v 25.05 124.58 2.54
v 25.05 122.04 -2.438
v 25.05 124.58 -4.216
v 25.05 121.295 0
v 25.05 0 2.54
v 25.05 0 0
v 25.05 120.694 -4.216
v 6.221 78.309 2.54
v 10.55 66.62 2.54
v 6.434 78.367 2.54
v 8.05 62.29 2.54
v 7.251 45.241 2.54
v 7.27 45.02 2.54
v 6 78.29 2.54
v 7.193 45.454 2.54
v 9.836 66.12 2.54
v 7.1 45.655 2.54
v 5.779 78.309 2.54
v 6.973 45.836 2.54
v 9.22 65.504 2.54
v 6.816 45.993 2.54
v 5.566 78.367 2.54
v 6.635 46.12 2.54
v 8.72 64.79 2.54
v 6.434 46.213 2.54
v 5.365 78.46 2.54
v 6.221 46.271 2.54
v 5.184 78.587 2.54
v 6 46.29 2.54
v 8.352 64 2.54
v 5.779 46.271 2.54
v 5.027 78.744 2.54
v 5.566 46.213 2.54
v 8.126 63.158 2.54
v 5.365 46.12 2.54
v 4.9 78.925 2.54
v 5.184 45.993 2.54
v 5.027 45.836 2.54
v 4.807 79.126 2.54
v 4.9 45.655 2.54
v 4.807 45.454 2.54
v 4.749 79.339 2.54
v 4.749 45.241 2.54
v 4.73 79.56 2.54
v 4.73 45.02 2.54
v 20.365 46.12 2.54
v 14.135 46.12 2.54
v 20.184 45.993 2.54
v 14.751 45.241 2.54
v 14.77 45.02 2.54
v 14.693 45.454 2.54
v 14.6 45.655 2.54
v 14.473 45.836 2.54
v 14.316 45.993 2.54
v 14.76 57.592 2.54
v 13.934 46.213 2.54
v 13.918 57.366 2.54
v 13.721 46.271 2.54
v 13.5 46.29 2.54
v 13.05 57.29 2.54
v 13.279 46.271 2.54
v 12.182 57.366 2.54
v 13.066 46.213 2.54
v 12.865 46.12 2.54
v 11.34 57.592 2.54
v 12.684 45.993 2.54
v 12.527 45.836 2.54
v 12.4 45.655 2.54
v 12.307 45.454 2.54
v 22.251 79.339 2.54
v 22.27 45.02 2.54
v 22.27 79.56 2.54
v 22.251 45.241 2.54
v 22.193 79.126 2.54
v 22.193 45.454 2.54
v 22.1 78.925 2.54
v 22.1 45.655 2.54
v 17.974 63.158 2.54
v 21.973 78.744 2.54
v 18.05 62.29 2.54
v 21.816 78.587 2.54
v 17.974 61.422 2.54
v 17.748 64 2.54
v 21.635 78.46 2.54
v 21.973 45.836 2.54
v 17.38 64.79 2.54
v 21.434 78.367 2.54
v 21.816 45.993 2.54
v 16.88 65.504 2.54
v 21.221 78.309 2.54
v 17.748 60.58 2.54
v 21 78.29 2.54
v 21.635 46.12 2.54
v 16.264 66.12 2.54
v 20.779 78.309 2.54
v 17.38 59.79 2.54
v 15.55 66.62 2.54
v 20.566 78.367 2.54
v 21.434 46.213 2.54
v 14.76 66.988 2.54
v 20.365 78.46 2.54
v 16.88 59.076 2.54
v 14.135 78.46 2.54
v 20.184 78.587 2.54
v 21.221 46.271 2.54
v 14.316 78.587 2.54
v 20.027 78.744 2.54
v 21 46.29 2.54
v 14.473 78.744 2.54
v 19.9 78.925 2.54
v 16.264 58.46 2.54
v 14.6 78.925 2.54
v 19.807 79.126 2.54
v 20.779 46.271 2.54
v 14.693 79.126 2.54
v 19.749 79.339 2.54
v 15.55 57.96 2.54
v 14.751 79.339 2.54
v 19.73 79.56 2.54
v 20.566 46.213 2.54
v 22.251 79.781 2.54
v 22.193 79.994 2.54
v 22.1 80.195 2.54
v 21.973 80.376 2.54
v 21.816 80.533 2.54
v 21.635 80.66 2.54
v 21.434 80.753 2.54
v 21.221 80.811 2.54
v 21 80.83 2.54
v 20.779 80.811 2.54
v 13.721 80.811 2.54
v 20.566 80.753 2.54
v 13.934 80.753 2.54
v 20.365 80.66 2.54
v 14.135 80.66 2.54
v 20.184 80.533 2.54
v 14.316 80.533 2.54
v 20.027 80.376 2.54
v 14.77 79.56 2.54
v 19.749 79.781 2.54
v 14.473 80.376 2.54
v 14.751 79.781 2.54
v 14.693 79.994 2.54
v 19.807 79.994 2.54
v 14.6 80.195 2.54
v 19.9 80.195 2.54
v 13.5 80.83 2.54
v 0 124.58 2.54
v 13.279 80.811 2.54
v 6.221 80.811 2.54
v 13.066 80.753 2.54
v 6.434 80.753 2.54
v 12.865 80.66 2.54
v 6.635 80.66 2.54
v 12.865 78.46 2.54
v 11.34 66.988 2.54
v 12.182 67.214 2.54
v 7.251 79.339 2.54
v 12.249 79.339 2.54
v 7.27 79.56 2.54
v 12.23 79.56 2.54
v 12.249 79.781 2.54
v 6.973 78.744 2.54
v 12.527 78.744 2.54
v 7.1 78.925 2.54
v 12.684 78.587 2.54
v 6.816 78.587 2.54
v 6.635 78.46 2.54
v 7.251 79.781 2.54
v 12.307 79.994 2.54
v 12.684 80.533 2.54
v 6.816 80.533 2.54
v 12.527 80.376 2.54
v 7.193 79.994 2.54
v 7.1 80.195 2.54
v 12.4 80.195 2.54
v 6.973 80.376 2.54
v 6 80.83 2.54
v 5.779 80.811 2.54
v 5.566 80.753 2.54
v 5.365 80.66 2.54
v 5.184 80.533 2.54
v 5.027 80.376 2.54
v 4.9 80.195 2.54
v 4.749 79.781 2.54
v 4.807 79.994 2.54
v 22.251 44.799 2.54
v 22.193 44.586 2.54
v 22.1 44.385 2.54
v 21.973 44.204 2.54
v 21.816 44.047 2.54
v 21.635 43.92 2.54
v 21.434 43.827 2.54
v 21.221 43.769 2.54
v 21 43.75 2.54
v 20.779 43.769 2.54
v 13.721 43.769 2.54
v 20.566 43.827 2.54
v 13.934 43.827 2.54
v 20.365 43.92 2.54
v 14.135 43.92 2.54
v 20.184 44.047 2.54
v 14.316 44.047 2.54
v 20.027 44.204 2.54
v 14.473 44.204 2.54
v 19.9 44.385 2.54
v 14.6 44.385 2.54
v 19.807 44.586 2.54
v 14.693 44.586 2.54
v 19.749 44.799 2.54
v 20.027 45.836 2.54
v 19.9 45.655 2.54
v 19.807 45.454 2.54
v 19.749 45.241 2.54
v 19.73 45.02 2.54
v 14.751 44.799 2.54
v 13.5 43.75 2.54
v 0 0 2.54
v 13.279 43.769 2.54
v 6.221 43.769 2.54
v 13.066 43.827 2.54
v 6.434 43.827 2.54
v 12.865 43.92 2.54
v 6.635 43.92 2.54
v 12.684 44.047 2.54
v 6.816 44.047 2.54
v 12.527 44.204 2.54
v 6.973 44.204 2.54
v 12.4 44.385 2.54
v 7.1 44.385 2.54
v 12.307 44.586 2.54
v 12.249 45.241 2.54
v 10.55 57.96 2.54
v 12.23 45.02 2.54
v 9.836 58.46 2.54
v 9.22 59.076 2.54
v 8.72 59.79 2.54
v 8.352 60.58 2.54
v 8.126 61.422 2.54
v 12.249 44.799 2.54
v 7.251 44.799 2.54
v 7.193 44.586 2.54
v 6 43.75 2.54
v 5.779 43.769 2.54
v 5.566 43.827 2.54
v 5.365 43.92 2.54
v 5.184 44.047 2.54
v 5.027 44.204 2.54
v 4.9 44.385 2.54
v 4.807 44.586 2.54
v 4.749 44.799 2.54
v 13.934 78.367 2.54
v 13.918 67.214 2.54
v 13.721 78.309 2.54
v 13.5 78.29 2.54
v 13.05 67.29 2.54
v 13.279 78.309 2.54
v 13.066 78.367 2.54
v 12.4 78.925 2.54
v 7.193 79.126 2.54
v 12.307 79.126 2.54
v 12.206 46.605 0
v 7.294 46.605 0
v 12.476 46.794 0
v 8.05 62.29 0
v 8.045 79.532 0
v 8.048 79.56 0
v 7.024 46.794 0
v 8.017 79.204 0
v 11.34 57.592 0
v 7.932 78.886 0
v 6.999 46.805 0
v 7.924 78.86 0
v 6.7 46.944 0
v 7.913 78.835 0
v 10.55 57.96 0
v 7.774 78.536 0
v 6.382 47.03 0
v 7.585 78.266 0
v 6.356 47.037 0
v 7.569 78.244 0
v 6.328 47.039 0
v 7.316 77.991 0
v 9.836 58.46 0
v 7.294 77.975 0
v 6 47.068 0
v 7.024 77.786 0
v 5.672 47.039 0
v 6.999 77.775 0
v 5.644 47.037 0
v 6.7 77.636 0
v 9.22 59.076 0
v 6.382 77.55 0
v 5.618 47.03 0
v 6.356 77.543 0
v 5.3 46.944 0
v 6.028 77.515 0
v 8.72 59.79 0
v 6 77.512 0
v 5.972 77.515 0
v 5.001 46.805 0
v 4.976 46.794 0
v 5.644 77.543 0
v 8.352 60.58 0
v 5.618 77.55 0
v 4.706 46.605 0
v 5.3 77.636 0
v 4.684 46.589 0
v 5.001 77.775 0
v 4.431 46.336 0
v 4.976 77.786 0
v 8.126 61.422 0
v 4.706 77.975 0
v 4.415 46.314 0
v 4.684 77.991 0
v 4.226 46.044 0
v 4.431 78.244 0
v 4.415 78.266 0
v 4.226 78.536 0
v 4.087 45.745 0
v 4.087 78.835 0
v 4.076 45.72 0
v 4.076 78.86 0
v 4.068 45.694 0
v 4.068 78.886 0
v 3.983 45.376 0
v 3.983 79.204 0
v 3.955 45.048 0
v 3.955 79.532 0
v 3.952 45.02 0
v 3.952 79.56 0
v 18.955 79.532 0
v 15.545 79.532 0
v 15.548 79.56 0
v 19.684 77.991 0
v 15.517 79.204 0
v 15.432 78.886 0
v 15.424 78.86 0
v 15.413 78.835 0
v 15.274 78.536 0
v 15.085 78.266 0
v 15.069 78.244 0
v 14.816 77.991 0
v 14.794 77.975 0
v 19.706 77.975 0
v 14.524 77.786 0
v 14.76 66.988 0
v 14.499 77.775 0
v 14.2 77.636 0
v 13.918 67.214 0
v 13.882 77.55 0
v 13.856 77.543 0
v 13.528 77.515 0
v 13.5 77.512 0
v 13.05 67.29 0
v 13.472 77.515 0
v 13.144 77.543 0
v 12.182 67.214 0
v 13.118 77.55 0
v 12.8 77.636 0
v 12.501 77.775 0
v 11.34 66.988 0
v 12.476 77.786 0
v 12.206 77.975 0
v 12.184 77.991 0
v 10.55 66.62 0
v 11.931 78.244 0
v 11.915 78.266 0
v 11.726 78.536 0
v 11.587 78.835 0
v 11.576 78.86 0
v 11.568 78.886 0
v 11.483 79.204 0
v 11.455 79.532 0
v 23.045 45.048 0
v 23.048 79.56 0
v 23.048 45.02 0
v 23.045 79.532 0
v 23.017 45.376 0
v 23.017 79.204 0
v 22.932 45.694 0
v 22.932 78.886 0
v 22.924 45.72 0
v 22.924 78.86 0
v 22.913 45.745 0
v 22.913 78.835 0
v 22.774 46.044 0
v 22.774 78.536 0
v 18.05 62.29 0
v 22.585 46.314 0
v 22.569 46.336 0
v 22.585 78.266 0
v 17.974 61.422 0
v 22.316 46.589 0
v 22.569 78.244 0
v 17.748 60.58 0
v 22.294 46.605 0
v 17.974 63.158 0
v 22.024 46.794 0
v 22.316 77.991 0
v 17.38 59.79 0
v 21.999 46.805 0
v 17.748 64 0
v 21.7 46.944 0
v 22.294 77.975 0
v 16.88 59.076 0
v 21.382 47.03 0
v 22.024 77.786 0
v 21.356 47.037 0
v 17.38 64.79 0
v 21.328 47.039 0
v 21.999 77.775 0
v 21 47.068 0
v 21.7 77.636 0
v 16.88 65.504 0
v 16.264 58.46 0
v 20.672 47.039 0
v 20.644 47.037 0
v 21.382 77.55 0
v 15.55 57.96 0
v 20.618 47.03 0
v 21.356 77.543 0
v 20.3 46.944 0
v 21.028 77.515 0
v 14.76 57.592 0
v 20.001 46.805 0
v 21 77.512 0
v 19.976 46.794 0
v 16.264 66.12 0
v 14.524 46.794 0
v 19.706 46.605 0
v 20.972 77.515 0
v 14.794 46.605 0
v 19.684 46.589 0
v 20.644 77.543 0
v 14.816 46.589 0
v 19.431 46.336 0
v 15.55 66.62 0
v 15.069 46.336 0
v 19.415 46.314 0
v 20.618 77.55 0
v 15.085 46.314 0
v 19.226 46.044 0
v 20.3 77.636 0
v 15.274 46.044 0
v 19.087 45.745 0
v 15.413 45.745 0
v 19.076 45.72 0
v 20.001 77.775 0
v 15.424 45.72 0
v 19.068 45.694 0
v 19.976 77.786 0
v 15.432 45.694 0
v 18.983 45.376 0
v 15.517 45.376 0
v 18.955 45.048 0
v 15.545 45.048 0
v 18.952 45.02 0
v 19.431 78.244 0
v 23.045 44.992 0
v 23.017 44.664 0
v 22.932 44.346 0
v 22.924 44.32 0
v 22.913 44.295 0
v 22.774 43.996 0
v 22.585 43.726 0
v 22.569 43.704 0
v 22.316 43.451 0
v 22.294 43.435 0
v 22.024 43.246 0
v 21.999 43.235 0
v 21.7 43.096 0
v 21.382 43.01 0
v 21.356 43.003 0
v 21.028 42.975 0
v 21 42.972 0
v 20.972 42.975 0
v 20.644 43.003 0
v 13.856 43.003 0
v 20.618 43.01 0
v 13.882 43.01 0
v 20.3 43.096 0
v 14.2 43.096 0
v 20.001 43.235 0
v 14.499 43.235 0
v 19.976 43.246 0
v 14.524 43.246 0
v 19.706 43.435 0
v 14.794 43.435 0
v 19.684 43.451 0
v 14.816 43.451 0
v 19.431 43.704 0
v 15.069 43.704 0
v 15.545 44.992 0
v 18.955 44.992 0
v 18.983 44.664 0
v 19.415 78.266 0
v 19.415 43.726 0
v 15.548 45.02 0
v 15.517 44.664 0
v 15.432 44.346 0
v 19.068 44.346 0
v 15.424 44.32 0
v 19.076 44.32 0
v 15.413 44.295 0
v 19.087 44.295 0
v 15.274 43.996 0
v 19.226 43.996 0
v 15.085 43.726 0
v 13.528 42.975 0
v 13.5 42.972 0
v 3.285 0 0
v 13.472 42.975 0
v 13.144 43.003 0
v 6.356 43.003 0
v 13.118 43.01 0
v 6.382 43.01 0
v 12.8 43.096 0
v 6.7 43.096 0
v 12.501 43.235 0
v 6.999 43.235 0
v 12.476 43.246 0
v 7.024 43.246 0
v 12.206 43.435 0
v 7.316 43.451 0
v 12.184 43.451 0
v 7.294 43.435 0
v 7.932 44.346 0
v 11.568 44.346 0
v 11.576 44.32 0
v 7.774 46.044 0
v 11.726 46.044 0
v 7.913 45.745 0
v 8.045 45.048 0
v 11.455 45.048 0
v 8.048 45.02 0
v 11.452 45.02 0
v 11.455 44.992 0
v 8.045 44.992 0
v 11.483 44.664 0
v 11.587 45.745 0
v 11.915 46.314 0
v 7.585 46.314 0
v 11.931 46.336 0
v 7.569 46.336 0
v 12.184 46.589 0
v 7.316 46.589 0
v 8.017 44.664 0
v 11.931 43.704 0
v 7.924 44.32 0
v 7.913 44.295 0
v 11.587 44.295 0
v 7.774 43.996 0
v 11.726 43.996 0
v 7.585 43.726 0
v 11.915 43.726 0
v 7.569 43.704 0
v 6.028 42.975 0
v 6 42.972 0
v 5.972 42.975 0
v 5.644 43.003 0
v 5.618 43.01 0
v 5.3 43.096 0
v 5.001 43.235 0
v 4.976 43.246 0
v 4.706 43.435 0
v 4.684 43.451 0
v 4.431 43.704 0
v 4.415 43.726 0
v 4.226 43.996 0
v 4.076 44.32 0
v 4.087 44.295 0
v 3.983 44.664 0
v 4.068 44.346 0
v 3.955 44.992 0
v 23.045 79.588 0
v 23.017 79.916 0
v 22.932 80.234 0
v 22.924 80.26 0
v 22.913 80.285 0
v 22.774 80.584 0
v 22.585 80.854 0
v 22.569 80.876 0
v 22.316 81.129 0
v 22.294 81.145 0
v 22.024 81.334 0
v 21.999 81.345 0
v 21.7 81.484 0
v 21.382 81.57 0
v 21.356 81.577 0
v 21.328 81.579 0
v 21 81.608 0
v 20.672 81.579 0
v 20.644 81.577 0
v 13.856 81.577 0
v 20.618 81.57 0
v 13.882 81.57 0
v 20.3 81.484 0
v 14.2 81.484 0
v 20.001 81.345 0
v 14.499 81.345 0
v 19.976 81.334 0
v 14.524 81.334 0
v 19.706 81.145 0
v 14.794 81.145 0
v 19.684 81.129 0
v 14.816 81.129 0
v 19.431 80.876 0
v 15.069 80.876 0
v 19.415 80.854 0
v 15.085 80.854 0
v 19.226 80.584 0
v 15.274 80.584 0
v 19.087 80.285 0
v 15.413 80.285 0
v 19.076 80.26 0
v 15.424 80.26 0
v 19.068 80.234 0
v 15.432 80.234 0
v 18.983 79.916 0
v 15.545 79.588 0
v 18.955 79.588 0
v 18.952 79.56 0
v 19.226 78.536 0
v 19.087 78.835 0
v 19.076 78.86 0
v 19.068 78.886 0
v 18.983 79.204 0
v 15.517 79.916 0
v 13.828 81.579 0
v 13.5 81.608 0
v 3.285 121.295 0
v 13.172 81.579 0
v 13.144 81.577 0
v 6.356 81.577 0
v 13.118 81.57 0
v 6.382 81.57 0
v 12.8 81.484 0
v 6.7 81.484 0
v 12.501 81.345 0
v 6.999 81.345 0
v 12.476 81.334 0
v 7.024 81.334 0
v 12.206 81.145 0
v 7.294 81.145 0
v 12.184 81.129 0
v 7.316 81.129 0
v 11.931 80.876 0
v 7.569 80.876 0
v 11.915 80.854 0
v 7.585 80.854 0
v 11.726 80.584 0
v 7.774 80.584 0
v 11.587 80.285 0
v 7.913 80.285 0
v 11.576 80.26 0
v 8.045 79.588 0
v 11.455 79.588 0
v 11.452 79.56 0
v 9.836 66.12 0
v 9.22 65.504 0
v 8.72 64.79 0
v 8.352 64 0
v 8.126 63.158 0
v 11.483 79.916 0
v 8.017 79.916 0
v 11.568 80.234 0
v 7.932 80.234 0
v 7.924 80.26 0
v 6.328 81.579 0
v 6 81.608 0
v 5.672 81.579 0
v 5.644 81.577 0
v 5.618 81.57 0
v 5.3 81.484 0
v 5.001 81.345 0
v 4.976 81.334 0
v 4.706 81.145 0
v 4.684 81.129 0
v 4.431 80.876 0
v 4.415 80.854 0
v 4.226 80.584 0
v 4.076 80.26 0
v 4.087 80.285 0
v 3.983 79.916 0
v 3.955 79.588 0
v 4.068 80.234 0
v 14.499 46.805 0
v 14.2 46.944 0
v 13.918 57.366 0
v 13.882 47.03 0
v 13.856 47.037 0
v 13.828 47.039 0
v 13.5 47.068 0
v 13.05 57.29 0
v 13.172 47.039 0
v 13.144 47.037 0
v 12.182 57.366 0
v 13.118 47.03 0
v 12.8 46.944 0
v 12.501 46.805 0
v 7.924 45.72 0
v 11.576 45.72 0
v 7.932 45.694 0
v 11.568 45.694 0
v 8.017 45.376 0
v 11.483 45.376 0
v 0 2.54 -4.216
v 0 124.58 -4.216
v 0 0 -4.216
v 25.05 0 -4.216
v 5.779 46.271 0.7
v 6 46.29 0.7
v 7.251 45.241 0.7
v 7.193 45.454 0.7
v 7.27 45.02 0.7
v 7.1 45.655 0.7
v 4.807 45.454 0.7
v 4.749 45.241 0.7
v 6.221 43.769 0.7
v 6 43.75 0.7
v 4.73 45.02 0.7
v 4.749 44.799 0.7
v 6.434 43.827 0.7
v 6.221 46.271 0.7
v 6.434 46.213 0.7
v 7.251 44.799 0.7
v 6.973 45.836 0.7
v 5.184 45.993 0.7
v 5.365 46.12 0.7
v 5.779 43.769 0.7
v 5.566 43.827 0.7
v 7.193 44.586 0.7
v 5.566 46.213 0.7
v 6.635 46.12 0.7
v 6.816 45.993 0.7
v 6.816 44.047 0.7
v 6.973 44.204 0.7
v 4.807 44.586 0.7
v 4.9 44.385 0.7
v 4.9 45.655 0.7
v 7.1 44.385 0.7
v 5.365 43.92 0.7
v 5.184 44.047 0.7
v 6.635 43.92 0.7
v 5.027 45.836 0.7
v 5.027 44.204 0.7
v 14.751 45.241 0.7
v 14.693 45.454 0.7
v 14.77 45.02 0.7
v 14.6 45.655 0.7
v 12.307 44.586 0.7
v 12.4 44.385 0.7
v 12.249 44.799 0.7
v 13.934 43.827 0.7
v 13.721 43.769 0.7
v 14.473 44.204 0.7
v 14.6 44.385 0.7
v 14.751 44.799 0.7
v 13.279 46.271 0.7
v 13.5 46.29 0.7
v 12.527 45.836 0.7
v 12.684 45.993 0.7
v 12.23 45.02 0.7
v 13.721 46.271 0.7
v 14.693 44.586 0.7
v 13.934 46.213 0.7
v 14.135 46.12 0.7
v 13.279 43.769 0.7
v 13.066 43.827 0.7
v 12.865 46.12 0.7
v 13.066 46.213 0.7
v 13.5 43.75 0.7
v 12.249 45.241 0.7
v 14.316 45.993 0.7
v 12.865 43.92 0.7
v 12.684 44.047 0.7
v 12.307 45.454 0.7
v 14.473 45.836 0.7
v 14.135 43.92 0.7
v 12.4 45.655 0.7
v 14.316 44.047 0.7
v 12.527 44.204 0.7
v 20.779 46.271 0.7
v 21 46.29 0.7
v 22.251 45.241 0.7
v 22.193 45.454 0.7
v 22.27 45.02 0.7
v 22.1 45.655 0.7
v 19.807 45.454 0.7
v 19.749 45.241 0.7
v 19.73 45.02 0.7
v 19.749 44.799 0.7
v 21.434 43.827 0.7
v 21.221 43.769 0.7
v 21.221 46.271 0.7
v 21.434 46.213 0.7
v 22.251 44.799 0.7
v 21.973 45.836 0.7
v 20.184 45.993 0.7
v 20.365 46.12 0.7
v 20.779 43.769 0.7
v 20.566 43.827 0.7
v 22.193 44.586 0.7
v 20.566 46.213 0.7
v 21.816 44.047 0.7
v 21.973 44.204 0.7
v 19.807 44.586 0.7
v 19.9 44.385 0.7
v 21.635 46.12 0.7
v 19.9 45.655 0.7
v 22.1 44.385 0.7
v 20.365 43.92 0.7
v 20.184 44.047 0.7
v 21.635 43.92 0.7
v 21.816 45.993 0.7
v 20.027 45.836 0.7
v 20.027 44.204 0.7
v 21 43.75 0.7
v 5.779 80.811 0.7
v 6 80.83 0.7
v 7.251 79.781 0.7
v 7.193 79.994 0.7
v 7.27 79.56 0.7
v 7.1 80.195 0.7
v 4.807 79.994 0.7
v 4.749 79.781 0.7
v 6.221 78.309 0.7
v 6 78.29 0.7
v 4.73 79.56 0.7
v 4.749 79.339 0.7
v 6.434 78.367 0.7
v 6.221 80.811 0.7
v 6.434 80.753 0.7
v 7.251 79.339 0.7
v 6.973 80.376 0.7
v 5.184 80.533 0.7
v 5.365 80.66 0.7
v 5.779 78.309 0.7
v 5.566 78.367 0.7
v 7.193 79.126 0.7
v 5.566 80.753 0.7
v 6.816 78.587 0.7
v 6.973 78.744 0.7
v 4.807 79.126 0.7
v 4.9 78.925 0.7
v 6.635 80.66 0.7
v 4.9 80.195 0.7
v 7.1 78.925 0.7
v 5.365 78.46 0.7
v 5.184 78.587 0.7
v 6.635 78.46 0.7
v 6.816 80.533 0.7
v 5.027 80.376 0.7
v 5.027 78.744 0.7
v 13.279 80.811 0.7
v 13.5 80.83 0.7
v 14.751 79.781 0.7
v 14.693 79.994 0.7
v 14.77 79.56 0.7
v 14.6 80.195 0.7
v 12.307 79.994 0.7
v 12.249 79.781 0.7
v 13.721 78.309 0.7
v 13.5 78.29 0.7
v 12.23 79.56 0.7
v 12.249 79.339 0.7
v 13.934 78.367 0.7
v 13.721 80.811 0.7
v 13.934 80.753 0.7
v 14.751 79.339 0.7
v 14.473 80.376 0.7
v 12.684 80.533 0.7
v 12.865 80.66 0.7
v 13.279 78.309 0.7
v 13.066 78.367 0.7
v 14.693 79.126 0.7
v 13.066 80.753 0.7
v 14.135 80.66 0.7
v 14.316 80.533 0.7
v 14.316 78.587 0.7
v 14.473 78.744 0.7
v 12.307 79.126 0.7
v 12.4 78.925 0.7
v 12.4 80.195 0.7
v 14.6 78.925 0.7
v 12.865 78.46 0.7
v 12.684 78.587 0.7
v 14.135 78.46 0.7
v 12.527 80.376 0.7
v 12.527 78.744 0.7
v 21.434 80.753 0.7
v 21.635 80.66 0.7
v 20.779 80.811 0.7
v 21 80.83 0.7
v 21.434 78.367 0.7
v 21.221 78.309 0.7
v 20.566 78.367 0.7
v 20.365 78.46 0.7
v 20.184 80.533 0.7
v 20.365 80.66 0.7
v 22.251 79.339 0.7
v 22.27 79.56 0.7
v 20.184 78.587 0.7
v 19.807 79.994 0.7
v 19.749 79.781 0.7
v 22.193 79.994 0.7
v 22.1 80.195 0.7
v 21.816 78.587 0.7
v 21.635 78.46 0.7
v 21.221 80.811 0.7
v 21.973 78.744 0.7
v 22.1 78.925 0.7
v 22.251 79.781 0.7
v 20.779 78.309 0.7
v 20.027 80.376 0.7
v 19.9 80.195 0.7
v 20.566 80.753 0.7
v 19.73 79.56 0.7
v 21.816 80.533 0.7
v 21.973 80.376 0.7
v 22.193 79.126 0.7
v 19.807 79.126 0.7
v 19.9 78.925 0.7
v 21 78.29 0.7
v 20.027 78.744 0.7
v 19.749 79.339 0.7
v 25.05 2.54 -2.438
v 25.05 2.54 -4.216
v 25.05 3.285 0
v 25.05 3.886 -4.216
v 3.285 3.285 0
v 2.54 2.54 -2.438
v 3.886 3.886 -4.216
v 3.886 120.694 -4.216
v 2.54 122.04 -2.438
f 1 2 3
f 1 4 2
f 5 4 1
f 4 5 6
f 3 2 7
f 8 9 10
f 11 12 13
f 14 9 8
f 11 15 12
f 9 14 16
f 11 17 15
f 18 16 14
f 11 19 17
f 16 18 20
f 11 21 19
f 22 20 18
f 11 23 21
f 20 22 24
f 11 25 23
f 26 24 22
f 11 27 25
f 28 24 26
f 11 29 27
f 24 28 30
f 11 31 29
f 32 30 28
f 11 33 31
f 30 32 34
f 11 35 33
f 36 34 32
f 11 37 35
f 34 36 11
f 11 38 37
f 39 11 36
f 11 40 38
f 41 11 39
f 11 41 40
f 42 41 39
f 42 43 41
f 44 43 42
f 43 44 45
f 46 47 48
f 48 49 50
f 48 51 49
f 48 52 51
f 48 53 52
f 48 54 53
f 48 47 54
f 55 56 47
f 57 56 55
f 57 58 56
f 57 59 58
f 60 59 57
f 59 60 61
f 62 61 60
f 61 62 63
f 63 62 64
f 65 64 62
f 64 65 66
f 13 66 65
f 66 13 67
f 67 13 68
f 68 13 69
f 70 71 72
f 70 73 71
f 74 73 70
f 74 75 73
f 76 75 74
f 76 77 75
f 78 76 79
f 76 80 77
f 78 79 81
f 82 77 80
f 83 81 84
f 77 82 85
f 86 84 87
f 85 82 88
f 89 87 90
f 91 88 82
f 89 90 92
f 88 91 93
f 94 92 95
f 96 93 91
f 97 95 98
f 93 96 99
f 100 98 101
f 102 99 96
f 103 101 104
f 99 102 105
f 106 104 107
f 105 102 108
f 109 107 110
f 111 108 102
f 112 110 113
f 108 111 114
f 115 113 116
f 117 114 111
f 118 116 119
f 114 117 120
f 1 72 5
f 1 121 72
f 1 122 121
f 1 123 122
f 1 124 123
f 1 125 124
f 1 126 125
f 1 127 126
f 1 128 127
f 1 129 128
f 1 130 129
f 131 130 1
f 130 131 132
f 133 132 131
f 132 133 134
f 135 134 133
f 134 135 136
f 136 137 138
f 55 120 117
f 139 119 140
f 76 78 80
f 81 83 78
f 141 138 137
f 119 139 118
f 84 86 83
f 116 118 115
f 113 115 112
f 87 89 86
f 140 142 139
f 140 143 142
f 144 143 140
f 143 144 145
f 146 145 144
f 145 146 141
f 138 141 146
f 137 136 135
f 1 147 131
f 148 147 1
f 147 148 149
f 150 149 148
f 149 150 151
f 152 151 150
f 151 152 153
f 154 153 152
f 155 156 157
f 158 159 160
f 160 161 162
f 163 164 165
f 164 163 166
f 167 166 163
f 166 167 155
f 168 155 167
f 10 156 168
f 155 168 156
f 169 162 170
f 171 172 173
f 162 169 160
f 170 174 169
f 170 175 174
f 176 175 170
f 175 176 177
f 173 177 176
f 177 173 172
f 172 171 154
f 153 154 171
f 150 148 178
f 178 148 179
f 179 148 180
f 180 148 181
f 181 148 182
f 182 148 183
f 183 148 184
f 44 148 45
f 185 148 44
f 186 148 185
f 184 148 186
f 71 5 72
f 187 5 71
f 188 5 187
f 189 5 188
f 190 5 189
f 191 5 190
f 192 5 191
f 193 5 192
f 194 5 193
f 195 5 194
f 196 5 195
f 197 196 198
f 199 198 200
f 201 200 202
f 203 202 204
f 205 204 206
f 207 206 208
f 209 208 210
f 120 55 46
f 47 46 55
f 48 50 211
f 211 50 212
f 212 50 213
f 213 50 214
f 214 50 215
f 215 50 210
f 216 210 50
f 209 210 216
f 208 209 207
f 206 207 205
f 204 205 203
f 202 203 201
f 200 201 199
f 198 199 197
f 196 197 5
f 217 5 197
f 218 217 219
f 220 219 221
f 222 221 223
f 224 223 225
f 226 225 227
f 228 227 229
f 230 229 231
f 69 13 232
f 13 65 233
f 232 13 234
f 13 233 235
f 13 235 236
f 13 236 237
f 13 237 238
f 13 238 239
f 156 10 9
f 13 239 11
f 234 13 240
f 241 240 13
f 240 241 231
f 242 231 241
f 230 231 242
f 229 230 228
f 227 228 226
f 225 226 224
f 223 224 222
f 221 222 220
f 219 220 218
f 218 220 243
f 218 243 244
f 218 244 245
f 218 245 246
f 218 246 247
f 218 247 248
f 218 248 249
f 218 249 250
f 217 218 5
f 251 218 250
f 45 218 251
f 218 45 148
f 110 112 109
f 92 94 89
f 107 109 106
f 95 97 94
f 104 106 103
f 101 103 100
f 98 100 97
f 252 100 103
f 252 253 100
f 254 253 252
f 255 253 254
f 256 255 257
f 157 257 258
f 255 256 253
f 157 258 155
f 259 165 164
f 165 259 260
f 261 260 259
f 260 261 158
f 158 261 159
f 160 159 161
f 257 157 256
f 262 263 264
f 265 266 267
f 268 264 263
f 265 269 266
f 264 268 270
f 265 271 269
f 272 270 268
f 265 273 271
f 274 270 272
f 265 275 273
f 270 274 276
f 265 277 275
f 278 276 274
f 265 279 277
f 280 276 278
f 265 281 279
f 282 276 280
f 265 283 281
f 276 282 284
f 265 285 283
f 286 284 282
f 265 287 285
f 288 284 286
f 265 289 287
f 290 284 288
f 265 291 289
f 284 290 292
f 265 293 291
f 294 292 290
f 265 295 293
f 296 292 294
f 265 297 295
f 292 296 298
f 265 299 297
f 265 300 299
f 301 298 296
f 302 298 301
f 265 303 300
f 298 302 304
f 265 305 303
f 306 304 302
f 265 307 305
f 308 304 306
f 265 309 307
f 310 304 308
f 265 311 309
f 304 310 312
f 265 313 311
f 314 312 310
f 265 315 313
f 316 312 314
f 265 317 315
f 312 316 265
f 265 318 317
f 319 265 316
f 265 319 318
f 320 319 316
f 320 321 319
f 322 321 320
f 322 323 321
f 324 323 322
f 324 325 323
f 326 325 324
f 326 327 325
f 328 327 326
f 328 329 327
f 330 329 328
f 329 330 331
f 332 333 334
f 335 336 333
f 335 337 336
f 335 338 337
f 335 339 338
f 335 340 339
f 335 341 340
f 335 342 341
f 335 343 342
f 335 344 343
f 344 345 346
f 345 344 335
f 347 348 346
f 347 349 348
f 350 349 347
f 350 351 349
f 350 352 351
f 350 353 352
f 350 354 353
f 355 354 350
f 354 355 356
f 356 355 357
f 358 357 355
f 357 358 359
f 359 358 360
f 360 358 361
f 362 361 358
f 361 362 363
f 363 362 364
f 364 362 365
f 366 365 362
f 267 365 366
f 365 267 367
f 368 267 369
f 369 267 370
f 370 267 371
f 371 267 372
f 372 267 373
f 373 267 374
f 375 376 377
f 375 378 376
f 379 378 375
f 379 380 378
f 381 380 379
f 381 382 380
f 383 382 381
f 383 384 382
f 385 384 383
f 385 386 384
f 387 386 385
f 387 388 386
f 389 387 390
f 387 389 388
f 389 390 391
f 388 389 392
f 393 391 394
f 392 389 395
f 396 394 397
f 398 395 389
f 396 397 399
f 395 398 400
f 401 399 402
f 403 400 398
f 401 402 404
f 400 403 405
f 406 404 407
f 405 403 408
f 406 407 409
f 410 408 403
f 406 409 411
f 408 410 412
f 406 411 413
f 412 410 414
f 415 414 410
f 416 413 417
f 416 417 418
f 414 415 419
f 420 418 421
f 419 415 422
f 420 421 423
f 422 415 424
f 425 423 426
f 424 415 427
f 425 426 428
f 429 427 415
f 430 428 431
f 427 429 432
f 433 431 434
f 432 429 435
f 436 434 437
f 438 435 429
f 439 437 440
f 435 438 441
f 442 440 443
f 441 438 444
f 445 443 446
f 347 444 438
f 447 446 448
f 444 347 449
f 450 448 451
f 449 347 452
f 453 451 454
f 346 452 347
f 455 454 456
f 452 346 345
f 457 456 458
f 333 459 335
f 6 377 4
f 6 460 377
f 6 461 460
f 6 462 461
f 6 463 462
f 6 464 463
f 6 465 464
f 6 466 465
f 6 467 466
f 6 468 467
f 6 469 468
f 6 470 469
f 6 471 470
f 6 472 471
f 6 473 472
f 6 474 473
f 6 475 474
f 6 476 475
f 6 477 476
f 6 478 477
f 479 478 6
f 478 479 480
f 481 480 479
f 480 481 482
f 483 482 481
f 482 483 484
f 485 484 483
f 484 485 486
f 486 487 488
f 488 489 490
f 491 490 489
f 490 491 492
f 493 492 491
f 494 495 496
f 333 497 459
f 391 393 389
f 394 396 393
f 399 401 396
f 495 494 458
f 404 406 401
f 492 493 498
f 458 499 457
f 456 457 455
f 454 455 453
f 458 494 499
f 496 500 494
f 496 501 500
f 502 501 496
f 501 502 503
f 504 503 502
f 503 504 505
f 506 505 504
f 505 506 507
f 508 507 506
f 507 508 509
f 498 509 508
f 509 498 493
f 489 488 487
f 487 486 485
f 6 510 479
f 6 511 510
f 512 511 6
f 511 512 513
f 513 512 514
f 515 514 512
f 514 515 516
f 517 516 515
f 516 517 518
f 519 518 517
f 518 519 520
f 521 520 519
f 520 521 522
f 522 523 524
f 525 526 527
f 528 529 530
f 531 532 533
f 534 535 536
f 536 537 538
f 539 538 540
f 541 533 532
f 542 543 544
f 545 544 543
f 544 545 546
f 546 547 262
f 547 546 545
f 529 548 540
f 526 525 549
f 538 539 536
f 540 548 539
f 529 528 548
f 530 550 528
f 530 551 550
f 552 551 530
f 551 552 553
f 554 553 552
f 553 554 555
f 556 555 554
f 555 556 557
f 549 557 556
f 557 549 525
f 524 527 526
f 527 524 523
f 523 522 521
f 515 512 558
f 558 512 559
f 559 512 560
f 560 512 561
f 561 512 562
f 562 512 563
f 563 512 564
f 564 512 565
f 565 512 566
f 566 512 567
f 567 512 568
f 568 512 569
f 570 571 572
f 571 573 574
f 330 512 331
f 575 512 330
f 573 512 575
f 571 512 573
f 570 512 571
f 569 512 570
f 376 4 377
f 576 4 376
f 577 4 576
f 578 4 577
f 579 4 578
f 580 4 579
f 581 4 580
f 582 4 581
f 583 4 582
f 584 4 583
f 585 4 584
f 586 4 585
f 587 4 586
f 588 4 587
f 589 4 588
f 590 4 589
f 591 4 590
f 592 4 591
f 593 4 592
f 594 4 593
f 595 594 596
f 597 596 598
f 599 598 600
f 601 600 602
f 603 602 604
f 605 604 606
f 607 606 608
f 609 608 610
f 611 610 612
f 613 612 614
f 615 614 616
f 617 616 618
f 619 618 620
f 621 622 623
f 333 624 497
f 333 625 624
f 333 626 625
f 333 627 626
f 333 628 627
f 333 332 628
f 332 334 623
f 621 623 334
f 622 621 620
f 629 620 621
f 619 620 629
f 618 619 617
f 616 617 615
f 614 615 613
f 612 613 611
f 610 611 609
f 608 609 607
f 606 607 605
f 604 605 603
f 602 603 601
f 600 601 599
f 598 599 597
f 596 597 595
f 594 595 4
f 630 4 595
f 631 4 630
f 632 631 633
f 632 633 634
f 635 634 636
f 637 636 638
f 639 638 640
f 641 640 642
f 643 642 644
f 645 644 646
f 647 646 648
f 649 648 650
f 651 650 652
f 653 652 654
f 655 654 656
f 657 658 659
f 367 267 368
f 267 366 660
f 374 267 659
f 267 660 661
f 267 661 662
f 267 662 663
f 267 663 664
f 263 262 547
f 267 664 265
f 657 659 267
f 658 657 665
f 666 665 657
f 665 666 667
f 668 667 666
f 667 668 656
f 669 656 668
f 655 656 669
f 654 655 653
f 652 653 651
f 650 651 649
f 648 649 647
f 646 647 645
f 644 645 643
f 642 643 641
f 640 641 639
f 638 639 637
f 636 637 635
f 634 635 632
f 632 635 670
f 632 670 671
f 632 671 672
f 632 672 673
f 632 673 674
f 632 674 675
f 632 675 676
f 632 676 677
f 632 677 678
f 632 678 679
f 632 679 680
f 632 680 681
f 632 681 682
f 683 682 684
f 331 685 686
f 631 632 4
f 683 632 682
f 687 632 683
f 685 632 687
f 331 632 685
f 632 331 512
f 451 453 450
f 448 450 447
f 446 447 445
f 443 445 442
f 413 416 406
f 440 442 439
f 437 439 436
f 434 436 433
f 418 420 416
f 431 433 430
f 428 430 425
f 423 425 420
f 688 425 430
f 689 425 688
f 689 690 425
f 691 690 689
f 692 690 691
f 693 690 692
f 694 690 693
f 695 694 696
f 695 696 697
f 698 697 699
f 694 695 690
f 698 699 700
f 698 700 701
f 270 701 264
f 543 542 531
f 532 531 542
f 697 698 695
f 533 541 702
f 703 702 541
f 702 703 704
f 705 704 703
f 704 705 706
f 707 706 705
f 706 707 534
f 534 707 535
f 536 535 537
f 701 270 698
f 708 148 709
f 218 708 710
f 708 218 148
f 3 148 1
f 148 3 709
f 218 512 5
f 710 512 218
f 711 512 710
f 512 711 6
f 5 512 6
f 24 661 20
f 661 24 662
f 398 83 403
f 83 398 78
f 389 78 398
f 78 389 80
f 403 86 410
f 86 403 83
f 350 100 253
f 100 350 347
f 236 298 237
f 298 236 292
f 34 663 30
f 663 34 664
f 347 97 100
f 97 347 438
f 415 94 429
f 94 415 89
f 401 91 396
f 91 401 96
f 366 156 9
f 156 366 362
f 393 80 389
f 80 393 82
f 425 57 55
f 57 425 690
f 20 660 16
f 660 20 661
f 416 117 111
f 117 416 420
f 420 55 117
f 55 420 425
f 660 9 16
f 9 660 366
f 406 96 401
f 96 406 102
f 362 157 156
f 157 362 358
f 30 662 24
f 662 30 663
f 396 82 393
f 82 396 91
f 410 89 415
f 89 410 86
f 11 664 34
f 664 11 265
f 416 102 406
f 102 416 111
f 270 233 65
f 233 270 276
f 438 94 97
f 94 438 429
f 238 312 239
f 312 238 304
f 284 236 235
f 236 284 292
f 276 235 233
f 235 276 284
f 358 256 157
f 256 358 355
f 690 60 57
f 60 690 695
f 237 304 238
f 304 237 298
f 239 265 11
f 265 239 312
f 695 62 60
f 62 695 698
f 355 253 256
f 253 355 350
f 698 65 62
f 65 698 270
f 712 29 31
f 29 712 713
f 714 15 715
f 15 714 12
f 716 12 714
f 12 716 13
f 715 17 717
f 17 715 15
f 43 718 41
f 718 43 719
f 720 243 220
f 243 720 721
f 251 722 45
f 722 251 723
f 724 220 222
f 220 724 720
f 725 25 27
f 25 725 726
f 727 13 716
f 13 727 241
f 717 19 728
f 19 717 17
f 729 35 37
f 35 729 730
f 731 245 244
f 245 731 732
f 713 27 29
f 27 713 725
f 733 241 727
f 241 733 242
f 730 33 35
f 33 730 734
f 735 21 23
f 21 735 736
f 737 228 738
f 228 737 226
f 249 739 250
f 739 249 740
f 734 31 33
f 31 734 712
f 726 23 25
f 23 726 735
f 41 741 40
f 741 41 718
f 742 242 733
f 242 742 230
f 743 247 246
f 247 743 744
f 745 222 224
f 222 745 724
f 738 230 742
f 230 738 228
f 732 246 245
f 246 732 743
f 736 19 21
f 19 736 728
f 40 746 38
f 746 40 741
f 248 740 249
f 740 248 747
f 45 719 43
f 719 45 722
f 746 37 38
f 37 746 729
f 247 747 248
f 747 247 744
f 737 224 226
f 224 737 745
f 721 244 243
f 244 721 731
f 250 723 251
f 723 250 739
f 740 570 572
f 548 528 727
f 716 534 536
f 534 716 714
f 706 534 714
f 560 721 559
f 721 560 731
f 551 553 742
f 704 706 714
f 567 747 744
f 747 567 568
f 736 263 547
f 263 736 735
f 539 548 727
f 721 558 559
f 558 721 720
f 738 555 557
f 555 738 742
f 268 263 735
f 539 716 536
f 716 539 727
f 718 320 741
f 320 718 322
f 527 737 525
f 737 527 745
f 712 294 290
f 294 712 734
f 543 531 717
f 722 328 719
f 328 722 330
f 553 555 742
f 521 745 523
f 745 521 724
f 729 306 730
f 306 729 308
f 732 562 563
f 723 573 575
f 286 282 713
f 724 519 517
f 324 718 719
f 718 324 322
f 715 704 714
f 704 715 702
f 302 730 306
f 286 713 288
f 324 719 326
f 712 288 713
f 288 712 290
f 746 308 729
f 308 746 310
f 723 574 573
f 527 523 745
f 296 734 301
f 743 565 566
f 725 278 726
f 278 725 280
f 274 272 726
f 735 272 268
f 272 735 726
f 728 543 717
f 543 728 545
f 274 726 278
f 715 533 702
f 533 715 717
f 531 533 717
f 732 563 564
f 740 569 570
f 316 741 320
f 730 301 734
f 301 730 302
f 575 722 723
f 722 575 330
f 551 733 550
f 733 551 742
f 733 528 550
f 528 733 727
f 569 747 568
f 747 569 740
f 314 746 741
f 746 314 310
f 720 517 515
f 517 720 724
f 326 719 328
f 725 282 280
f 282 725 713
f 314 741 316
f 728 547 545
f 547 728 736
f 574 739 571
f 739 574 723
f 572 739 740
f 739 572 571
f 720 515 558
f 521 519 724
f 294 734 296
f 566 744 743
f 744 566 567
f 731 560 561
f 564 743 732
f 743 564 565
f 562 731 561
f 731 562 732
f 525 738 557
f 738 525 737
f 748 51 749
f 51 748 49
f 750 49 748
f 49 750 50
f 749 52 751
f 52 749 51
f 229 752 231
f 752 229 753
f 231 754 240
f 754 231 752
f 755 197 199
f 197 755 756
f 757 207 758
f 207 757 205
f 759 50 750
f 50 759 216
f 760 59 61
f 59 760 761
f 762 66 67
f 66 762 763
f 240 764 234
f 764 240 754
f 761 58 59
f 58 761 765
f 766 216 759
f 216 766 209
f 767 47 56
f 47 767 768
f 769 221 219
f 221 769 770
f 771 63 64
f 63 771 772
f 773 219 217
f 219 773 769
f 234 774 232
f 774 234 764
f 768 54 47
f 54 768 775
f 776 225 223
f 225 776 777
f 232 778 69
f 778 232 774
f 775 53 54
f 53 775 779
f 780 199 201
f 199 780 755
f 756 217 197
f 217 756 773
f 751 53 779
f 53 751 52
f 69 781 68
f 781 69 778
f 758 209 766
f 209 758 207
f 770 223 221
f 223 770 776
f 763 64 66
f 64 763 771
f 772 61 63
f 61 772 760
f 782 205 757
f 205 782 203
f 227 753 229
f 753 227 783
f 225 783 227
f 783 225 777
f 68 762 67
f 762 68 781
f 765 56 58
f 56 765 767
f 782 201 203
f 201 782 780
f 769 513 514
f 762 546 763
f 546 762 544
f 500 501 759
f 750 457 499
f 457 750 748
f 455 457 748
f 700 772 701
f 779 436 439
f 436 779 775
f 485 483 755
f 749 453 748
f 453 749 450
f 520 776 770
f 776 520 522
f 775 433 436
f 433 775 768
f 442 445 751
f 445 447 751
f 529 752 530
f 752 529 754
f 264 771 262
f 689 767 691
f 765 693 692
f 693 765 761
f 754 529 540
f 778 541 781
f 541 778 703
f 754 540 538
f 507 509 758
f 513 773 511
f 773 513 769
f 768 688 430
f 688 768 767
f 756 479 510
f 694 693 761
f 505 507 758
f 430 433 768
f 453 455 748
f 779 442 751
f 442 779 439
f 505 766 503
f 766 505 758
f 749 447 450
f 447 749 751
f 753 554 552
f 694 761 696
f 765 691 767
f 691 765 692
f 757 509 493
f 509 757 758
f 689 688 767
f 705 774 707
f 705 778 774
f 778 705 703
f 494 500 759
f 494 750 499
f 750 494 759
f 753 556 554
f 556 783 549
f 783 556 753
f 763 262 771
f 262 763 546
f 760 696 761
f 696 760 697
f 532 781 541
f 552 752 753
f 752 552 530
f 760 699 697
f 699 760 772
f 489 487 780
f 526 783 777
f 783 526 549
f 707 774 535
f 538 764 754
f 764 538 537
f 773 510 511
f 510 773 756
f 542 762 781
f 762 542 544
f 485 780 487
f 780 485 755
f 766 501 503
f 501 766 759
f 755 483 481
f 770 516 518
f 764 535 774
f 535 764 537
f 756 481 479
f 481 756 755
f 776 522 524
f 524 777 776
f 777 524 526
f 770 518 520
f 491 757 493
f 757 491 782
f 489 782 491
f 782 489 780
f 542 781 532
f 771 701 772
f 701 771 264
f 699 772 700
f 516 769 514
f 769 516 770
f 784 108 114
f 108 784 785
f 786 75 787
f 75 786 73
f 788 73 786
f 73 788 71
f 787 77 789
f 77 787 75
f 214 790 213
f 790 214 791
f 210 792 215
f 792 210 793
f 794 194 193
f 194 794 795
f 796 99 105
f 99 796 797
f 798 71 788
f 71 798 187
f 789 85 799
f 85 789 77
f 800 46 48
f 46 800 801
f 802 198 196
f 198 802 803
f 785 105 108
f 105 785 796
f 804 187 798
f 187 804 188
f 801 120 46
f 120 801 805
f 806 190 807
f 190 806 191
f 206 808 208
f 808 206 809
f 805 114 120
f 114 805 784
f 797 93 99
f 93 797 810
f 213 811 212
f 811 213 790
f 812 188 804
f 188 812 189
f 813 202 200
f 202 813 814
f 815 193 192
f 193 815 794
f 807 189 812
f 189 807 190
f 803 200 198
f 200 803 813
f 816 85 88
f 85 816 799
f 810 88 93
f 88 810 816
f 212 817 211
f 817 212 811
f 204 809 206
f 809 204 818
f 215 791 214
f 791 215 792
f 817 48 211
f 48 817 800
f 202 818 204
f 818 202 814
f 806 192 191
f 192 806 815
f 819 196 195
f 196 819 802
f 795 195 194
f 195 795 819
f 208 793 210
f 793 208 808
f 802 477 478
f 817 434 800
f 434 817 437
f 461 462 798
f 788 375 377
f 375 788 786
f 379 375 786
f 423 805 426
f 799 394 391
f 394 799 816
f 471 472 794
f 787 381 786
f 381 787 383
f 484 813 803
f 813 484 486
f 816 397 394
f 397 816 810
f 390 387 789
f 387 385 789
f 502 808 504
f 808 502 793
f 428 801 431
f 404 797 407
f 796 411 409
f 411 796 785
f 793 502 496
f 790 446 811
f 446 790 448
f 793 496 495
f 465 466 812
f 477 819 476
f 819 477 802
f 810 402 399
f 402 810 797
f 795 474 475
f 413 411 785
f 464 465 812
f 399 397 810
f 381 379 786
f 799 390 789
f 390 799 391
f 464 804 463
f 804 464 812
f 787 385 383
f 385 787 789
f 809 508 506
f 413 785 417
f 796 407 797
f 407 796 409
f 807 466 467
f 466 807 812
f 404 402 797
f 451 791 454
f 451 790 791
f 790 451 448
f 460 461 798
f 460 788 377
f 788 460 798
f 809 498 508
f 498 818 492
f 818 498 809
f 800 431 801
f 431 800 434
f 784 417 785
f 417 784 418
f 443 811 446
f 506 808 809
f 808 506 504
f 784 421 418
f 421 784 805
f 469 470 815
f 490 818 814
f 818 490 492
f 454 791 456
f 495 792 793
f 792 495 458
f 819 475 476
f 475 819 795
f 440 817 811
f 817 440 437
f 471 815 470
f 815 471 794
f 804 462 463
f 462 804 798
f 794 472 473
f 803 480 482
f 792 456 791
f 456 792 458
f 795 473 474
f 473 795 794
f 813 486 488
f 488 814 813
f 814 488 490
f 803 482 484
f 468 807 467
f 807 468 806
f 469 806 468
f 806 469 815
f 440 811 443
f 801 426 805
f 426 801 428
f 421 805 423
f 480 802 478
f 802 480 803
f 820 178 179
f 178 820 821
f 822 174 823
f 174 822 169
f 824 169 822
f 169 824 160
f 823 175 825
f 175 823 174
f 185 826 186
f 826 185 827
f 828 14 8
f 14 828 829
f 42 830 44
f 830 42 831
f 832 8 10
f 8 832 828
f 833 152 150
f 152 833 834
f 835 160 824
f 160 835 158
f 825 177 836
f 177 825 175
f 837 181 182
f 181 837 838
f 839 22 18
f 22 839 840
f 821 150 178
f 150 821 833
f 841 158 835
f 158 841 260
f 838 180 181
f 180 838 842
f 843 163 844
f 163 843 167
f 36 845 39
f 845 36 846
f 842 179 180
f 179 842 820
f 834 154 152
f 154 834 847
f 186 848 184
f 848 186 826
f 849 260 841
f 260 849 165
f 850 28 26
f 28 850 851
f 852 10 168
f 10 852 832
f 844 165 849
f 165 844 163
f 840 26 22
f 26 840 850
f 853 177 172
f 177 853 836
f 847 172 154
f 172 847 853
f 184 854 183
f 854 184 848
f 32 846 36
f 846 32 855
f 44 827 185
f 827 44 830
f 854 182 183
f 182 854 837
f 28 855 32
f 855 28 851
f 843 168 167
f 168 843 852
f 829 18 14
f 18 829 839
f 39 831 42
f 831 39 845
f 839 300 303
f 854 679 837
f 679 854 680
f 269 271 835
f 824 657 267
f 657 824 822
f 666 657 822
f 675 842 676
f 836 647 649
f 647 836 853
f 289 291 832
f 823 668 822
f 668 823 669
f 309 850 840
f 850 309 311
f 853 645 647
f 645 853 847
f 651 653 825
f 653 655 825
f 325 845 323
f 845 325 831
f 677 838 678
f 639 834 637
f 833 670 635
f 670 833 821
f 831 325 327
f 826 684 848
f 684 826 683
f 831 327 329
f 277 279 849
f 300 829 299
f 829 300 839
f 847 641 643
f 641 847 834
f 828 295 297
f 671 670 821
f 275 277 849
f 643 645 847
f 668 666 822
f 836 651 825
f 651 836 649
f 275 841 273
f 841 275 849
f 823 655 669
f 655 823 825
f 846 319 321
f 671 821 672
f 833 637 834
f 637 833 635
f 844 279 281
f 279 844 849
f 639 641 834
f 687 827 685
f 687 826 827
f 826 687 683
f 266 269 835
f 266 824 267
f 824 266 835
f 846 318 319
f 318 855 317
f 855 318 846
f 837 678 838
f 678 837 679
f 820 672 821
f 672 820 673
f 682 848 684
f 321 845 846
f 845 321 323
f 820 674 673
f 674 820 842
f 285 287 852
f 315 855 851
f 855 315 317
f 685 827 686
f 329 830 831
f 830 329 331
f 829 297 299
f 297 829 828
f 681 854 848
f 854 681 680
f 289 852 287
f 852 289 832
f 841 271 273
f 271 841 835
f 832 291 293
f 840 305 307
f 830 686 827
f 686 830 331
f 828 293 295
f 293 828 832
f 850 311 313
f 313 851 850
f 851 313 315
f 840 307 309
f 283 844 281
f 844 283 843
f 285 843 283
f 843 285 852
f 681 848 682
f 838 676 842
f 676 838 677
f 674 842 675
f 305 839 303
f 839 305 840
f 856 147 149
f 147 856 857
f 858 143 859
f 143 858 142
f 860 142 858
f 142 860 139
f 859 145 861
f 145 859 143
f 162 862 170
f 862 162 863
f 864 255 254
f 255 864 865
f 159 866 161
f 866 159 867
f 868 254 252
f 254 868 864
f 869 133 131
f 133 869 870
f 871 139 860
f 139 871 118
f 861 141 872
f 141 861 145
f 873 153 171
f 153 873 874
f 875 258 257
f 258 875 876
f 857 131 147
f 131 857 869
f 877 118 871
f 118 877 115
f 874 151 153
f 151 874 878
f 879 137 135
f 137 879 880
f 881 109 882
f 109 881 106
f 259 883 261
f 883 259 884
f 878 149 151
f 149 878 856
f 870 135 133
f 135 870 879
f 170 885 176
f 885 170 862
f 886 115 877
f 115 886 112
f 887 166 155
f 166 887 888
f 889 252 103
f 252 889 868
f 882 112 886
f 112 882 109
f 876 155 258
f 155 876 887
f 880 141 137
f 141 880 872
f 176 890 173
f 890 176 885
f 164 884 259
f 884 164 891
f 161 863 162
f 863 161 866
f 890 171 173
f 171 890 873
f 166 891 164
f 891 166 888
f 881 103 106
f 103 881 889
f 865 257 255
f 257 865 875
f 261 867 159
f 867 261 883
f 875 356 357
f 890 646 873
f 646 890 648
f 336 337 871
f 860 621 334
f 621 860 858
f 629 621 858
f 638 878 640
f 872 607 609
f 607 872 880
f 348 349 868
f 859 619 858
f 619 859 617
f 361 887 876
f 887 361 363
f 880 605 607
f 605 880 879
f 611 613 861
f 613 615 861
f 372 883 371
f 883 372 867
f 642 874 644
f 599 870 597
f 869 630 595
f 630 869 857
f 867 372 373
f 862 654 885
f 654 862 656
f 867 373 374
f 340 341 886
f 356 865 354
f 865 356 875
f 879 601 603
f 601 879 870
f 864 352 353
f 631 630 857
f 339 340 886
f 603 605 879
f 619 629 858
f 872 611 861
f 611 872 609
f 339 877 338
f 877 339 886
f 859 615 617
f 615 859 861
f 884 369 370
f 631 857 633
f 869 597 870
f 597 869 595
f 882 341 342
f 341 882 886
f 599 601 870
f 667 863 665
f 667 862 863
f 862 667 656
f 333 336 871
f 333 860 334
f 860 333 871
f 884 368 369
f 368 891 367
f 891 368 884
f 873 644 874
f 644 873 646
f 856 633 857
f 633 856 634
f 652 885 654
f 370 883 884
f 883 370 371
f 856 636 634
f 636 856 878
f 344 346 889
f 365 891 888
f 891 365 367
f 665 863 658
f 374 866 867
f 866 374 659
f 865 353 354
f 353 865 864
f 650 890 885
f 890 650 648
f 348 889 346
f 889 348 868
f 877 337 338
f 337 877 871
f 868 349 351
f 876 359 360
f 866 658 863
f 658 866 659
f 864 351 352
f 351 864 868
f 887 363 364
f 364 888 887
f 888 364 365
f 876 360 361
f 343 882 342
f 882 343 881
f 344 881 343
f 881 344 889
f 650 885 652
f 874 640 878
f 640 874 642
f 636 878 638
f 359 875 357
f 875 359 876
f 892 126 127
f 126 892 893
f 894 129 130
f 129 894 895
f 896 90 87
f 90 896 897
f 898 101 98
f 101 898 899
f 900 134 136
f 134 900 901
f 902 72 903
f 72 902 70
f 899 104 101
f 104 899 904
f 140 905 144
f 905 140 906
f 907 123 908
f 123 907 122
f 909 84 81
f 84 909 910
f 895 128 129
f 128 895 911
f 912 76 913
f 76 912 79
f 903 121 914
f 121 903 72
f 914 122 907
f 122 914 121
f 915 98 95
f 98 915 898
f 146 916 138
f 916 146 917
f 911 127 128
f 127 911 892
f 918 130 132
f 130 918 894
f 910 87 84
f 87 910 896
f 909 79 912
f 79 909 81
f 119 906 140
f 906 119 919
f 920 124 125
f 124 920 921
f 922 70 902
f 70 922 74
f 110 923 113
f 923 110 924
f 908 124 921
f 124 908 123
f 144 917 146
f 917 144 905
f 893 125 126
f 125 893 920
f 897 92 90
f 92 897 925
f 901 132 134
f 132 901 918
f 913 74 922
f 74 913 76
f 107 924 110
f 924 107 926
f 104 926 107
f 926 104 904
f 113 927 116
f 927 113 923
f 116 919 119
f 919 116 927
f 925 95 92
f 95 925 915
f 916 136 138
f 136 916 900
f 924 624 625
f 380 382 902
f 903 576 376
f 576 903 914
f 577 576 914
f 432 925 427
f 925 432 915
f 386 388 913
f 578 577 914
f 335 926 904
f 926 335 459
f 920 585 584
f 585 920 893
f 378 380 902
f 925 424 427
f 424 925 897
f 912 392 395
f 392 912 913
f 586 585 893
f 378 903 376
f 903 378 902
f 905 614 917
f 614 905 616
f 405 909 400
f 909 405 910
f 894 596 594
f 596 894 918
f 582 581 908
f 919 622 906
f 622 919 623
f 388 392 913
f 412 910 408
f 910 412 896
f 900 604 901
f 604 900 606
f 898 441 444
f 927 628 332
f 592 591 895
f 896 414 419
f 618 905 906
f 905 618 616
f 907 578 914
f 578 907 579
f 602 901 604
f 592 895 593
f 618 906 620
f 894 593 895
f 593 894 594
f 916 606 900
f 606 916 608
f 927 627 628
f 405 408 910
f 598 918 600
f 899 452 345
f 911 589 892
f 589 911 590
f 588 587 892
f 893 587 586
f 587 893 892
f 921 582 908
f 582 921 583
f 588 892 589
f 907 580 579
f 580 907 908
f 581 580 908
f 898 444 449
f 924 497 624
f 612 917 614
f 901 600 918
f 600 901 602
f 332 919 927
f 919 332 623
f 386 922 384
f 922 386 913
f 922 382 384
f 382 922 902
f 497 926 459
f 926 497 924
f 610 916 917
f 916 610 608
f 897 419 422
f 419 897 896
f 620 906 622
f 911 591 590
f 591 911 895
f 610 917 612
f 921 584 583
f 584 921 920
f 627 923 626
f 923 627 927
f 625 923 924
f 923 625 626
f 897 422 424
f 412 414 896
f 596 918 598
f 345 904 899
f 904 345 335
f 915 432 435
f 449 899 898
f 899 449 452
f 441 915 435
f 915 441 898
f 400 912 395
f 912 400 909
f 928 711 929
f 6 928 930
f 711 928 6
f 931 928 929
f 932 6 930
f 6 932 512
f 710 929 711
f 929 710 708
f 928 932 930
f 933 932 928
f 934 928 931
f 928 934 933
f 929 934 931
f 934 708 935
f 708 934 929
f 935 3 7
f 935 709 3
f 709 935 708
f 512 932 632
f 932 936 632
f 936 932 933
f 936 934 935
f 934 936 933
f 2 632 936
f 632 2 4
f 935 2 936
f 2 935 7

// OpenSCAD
/*  Nexus 7 ATTACHMENT PLATE Design Sept 22, 2013
    Copyright 2013 Frank Thorley
    N7 CAMERA ADAPTER = ATTACHMENT PLATE + MIRROR HOLDER

    X is Height Direction for Adapter Plate
    Y is Width Direction for Adapter Plate
    Z is Thickness Direction for Adapter Plate
=========================================================================
*/

// Default # of cylinder sides
$fn = 36;

//  All Dimensions in mm, Angles (s & t) in Degrees
    a = 2.438;  // Bottom wedge height
    b = 1.778;  // Top wedge height
    c = 2.54;   // Thickness of rectangular edge retainers
    d = 4.216;  // Height of rectangular edge retainers
    e = 0.745;  // e = tan(s) * a Top wedge thickness
    f = 1.346;  // f = tan(t) * b Bottom wedge thickness
    g = 2.54;   // Top plate thickness ~ 0.1"
    h = 124.58; // Top plate width
    i = 25.05;  // Top plate height
    j = 45.02;  // Left edge offset for Row 1 securing holes centerline
    k = 62.29;  // Left edge offset for lens opening centerline
    l = 79.56;  // Left edge offset for Row 2 securing holes centerline
    m = 6.0;        // Mirror holder securing hole 1&4 offset from top
    n = 13.5;   // Mirror holder securing hole 2&5 offset from top
    p = 21.0;   // Mirror holder securing hole 3&6 offset from top
    r = 5.0;        // Lens opening 5mm radius
    s = 17;     // Angle of top wedge in degrees
    t = 37;     // Angle of bottom wedge in degrees
    u = 2.74;   // 0.1 above & 0.1 below surface to clear ALL holes
    v = 13.05;  // Lens opening offset from top
    w = 1.27;   // Mounting holes(6)radius, make pin radius 0.2 mm less
    x = 119.5;  // h - c -c for for length of top rectangular retainer
    y = 122.04; // Distance to right retainer rectangle y = h - c
    z = 22.51;  // Length of left and right retainer wedges
// Top Plate at Origin
        difference() {
                cube([i,124.58,g]); // "h" not working for dimension???
// Top Plate Lens Opening
            translate([v,k,-.1]) // Cylinder a little taller than plate
                cylinder(u,r,r);
// Mirror Holder Left Side Securing Holes
            translate([m,j,-0.1])
                cylinder(u,w,w);  // Top Left Hole
                    translate ([m,j,-0.1])
                        cylinder (0.8,1.7*w,w); // Countersink for Heat Riviting
            translate([n,j,-0.1])
                cylinder(u,w,w);
                    translate ([n,j,-0.1])
                        cylinder (0.8,1.7*w,w); // Countersink
            translate([p,j,-0.1])
                cylinder(u,w,w);
                    translate ([p,j,-0.1])
                        cylinder (0.8,1.7*w,w); // Countersink
// Mirror Holder Right Side Securing Holes
            translate([m,l,-0.1])
                cylinder(u,w,w);
                    translate ([m,l,-0.1])
                        cylinder (0.8,1.7*w,w); // Countersink
            translate([n,l,-0.1])
                cylinder(u,w,w);
                    translate ([n,l,-0.1])
                        cylinder (0.8,1.7*w,w); // Countersink
            translate([p,l,-0.1])
                cylinder(u,w,w);
                    translate ([p,l,-0.1])
                        cylinder (0.8,1.7*w,w); // Countersink
        }
// Upper & Lower Triangular Wedges Are Added to 3 Sides to Secure N7BWC to N7
// N7 Left Rectangular Perimeter w/Origin at Bottom Left Corner
        translate([0,0,-d]) {
            cube([i,c,d]);
//      Left Edge Upper Retainer Wedge
        rotate (a = [0,90,0])
            translate ([-d,c,c])
                linear_extrude (height = z, center = false, convexity = 10, twist = 0)
                    polygon (points = [[0,0], [a,0], [0,e]], paths= [[0,1,2]]);
        }
//      Left Edge Lower Retainer Wedge
        rotate (a = [0,-90,0]){
            translate([-d,c,-i])
                linear_extrude (height = z, center = false, convexity = 10, twist = 0)
                    polygon (points = [[0,0], [b,0], [0,f]], paths= [[0,1,2]]);
        }

// N7 Top Rectangular Perimeter
        translate([0,0,-d]) {
        cube([c,h,d]);
        }
//      Top Edge Upper Retainer Wedge
        rotate (a = [-90,0,0]){
            translate ([c,0,0])
                linear_extrude (height = h, center = false, convexity = 10, twist = 0)
                    polygon (points = [[0,0], [e,0], [0,a]], paths= [[0,1,2]]);
        }
//      Top Edge Lower Retainer Wedge
        rotate (a = [90,-0,0])
            translate ([c,-d,-h]) {
                linear_extrude (height = h, center = false, convexity = 10, twist = 0)
                    polygon (points = [[0,0], [f,0], [0,b]], paths= [[0,1,2]]);
        }
//  Right Edge Rectangular Perimeter
            translate([0,y,-d]) {
                cube([i,c,d]);
        }
//      Right Edge Upper Retainer Wedge
        rotate (a = [-180,90,0]){
            translate([0,-h+c,-i])
                linear_extrude (height = z, center = false, convexity = 10, twist = 0)
                    polygon (points = [[0,0], [a,0], [0,e]], paths= [[0,1,2]]);
        }
//      Right Edge Lower Retainer Wedge
        rotate (a = [180,-90,0])
            translate ([-d,-h+c,c]){
                linear_extrude (height = z, center = false, convexity = 10, twist = 0)
                    polygon (points = [[0,0], [b,0], [0,f]], paths= [[0,1,2]]);
        }
